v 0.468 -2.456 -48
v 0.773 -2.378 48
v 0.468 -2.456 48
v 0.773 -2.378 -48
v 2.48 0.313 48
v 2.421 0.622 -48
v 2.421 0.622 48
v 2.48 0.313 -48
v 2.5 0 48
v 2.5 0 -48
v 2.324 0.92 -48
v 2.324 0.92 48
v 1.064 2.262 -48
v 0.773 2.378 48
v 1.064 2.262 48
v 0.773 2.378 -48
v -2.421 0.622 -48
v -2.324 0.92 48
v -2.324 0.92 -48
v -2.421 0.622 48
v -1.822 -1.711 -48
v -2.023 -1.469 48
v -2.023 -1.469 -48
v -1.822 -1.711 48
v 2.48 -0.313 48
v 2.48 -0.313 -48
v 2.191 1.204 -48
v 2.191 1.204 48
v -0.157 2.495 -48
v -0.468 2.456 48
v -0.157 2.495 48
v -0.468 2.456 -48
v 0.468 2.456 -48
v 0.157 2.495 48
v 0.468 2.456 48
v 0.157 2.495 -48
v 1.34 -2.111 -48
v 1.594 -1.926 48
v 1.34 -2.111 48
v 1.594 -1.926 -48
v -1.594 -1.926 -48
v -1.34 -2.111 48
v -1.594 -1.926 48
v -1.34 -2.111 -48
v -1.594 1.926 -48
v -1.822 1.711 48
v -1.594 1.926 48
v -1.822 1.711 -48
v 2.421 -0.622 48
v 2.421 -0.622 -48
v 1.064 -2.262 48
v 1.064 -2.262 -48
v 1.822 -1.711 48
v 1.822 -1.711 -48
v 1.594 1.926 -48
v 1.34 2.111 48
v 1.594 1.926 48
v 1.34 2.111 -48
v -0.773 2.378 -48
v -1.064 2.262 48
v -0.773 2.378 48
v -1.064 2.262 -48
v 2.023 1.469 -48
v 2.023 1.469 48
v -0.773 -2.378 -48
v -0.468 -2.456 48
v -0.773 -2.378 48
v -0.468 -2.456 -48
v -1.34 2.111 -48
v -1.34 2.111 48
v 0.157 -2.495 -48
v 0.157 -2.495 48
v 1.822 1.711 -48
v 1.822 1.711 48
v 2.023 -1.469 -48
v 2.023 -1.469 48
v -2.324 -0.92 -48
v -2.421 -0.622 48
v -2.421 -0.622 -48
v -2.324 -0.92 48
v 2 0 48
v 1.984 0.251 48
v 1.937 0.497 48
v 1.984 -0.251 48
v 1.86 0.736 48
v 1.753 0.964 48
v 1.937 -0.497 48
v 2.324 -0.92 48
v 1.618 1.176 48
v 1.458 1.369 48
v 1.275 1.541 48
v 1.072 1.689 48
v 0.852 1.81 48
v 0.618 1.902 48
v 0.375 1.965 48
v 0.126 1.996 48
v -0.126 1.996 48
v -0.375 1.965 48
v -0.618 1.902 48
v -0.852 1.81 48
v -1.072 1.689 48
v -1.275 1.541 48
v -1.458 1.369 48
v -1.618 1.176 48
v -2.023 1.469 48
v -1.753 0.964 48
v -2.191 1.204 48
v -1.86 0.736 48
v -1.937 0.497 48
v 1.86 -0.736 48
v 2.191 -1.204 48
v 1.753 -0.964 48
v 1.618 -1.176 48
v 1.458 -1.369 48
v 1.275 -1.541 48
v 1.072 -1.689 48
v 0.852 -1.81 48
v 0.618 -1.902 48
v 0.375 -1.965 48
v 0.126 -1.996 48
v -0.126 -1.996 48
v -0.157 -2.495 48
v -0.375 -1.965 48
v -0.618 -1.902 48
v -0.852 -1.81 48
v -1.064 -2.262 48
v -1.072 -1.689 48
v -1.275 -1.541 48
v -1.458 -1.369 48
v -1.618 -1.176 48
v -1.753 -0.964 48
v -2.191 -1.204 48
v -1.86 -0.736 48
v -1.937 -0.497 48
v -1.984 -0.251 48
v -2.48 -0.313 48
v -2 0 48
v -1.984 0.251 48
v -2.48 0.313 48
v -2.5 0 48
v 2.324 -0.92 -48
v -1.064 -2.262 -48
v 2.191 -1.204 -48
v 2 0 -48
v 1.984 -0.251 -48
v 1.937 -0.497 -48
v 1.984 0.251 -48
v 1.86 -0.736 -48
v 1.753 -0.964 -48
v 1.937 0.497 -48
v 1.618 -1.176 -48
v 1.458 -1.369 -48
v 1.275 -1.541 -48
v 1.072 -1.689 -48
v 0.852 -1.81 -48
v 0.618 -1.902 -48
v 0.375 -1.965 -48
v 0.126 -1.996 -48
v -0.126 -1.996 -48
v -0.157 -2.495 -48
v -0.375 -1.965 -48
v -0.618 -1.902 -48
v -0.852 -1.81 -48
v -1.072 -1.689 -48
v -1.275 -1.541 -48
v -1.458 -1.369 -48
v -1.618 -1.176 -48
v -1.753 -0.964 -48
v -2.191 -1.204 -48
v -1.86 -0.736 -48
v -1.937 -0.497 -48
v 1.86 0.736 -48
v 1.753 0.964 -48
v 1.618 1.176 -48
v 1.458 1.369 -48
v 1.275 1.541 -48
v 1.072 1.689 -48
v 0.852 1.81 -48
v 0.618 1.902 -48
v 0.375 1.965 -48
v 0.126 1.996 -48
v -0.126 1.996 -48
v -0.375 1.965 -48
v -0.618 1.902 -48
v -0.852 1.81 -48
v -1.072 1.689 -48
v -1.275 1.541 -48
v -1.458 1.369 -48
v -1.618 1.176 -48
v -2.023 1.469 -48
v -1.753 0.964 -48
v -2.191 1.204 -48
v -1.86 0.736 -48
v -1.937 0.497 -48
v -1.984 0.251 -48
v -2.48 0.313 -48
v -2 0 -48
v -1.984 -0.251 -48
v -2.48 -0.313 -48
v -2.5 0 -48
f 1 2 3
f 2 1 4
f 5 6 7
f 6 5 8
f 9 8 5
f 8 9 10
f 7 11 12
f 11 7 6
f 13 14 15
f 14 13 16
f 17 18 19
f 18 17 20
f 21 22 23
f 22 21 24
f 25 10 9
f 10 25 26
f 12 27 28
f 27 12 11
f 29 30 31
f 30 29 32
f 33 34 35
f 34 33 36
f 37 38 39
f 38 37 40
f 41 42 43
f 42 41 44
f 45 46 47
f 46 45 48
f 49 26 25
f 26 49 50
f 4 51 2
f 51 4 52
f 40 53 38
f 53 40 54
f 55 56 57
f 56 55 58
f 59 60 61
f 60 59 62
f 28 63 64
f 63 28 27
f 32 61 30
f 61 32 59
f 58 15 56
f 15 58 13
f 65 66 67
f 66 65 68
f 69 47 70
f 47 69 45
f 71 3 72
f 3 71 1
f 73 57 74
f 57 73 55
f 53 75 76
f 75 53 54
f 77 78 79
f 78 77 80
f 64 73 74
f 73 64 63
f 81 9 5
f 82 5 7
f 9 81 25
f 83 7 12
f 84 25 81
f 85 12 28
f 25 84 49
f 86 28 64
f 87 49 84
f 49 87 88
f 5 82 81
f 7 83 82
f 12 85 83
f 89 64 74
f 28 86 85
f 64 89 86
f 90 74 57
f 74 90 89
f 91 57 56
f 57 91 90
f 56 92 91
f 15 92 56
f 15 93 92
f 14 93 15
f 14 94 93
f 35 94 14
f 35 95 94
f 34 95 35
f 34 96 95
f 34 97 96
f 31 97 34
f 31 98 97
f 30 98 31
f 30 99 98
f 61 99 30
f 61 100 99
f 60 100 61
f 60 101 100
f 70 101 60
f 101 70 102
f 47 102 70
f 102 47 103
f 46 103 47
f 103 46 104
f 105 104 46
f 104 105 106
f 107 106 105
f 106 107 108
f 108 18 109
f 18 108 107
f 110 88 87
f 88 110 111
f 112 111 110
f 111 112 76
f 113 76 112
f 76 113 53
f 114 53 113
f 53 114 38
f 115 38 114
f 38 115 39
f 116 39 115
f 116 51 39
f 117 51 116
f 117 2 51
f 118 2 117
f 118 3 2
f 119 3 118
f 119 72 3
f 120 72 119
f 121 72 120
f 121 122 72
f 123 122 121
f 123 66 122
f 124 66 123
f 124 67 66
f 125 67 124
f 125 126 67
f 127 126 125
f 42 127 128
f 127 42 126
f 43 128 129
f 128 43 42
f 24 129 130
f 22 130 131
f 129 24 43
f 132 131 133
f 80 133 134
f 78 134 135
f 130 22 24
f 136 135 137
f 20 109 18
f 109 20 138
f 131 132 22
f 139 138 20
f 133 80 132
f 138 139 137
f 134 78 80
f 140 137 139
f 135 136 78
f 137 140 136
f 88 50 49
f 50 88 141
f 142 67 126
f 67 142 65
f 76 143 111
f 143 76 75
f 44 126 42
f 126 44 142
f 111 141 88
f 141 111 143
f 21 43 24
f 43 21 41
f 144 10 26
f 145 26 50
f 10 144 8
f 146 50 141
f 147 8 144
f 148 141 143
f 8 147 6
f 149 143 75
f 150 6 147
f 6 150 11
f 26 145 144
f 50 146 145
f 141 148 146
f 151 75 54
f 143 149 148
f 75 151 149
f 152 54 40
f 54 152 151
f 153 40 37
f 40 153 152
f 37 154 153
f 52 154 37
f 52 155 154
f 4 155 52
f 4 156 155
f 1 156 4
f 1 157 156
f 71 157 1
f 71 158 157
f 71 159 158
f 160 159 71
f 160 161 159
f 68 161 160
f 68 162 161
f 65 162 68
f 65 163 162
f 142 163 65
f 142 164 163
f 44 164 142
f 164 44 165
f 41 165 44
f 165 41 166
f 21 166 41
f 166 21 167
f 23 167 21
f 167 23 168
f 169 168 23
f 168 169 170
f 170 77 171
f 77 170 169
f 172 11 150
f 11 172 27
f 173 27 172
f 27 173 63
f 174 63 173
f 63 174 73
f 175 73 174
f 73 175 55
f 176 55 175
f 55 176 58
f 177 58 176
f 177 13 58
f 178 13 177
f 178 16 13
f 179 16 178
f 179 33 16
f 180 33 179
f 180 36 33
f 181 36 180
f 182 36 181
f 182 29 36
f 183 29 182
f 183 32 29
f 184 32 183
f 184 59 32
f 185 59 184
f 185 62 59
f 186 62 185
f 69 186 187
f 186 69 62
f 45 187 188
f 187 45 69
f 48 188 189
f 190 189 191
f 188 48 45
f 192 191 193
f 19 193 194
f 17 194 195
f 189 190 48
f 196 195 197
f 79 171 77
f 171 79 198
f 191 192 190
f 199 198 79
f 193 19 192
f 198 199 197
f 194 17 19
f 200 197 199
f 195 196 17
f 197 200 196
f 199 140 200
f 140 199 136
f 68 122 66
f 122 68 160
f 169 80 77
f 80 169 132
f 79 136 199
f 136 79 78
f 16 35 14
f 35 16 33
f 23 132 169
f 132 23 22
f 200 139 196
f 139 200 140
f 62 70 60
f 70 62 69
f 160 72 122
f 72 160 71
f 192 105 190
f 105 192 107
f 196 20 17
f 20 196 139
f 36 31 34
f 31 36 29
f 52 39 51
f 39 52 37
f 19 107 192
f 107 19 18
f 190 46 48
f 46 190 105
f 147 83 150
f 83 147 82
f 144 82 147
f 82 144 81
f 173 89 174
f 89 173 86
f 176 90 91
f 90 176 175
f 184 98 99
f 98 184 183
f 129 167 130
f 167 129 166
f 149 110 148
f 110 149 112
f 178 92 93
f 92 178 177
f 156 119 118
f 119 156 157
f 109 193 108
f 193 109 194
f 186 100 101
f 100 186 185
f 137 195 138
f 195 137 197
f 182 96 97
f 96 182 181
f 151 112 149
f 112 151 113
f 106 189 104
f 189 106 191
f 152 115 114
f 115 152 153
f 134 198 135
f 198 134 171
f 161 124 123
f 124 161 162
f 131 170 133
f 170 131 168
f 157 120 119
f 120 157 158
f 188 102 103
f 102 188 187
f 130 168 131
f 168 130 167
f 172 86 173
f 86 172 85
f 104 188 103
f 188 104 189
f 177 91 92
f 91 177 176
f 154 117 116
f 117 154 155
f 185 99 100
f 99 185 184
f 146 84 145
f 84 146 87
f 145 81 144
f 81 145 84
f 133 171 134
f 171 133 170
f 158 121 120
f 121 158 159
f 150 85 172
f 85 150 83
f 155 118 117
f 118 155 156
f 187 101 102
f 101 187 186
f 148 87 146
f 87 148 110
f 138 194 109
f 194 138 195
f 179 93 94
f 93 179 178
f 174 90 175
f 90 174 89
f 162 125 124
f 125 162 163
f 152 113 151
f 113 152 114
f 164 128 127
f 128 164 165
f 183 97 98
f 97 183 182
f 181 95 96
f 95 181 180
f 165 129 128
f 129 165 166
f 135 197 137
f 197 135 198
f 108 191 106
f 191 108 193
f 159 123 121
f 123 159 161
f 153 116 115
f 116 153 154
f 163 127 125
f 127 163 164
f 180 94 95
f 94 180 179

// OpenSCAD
$fn = 50;


difference() {
	union() {
		translate(v = [0, 0, -48.0000000000]) {
			cylinder(h = 96, r = 2.5000000000);
		}
	}
	union() {
		translate(v = [0, 0, -100.0000000000]) {
			cylinder(h = 200, r = 2.0000000000);
		}
	}
}
